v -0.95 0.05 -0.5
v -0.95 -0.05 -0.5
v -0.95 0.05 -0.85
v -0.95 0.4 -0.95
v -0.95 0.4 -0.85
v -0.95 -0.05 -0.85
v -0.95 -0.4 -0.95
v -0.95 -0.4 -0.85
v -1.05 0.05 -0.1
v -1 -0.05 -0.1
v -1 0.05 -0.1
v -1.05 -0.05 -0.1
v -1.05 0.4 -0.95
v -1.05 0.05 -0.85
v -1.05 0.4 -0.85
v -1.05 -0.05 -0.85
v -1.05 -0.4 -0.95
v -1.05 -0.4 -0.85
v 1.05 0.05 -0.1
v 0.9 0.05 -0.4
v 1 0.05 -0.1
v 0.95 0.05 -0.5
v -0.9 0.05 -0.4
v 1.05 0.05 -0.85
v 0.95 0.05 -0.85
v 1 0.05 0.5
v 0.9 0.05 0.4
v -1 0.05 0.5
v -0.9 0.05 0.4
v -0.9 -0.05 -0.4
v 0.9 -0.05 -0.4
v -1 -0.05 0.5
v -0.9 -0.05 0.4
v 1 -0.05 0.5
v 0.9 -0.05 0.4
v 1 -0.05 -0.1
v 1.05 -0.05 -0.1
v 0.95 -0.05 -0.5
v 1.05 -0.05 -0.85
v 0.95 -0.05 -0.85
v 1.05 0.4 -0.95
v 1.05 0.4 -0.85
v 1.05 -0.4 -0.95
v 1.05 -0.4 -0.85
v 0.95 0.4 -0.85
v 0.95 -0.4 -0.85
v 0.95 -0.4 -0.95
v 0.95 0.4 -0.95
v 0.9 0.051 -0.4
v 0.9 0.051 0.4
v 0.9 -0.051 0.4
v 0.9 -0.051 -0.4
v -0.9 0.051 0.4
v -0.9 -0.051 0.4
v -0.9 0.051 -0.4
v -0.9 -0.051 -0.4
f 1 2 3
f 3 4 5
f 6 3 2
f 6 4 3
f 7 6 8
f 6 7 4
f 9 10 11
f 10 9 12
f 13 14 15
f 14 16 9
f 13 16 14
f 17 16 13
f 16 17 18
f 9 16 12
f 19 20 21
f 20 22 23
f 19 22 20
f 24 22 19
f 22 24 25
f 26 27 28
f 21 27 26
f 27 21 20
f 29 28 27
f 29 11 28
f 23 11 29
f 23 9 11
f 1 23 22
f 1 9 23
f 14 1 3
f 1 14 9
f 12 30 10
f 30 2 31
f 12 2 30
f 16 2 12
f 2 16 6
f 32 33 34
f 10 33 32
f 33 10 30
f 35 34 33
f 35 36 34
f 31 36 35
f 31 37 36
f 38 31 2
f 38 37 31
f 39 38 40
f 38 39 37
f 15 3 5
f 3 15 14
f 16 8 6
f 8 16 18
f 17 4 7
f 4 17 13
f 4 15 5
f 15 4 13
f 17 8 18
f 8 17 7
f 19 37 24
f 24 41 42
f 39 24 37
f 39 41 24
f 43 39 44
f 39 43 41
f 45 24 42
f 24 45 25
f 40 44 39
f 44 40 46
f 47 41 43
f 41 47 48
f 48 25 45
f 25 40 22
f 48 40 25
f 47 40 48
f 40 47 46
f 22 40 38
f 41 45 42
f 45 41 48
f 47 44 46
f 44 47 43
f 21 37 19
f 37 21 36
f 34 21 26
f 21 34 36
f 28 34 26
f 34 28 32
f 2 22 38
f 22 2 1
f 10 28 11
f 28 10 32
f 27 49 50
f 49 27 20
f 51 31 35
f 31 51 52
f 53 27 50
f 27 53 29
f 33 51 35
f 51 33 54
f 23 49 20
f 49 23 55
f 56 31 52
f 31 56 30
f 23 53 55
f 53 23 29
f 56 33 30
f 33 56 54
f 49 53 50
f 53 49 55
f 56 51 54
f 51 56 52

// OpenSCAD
union(){
color("#c87d3a")
cube([2,0.1,1],center =true);

color("#424e63")
cube([1.8,0.102,0.8],center =true);


color("#c87d3a"){
translate([1,0,-0.5]){
cube([0.1,0.1,0.8],center =true);
}


color("#c87d3a"){
translate([-1,0,-0.5]){
cube([0.1,0.1,0.8],center =true);
}


color("#c87d3a"){
translate([-1,0,-0.9]){
cube([0.1,0.8,0.1],center =true);
}
}

color("#c87d3a"){
translate([1,0,-0.9]){
cube([0.1,0.8,0.1],center =true);
}
}



}
}

}
